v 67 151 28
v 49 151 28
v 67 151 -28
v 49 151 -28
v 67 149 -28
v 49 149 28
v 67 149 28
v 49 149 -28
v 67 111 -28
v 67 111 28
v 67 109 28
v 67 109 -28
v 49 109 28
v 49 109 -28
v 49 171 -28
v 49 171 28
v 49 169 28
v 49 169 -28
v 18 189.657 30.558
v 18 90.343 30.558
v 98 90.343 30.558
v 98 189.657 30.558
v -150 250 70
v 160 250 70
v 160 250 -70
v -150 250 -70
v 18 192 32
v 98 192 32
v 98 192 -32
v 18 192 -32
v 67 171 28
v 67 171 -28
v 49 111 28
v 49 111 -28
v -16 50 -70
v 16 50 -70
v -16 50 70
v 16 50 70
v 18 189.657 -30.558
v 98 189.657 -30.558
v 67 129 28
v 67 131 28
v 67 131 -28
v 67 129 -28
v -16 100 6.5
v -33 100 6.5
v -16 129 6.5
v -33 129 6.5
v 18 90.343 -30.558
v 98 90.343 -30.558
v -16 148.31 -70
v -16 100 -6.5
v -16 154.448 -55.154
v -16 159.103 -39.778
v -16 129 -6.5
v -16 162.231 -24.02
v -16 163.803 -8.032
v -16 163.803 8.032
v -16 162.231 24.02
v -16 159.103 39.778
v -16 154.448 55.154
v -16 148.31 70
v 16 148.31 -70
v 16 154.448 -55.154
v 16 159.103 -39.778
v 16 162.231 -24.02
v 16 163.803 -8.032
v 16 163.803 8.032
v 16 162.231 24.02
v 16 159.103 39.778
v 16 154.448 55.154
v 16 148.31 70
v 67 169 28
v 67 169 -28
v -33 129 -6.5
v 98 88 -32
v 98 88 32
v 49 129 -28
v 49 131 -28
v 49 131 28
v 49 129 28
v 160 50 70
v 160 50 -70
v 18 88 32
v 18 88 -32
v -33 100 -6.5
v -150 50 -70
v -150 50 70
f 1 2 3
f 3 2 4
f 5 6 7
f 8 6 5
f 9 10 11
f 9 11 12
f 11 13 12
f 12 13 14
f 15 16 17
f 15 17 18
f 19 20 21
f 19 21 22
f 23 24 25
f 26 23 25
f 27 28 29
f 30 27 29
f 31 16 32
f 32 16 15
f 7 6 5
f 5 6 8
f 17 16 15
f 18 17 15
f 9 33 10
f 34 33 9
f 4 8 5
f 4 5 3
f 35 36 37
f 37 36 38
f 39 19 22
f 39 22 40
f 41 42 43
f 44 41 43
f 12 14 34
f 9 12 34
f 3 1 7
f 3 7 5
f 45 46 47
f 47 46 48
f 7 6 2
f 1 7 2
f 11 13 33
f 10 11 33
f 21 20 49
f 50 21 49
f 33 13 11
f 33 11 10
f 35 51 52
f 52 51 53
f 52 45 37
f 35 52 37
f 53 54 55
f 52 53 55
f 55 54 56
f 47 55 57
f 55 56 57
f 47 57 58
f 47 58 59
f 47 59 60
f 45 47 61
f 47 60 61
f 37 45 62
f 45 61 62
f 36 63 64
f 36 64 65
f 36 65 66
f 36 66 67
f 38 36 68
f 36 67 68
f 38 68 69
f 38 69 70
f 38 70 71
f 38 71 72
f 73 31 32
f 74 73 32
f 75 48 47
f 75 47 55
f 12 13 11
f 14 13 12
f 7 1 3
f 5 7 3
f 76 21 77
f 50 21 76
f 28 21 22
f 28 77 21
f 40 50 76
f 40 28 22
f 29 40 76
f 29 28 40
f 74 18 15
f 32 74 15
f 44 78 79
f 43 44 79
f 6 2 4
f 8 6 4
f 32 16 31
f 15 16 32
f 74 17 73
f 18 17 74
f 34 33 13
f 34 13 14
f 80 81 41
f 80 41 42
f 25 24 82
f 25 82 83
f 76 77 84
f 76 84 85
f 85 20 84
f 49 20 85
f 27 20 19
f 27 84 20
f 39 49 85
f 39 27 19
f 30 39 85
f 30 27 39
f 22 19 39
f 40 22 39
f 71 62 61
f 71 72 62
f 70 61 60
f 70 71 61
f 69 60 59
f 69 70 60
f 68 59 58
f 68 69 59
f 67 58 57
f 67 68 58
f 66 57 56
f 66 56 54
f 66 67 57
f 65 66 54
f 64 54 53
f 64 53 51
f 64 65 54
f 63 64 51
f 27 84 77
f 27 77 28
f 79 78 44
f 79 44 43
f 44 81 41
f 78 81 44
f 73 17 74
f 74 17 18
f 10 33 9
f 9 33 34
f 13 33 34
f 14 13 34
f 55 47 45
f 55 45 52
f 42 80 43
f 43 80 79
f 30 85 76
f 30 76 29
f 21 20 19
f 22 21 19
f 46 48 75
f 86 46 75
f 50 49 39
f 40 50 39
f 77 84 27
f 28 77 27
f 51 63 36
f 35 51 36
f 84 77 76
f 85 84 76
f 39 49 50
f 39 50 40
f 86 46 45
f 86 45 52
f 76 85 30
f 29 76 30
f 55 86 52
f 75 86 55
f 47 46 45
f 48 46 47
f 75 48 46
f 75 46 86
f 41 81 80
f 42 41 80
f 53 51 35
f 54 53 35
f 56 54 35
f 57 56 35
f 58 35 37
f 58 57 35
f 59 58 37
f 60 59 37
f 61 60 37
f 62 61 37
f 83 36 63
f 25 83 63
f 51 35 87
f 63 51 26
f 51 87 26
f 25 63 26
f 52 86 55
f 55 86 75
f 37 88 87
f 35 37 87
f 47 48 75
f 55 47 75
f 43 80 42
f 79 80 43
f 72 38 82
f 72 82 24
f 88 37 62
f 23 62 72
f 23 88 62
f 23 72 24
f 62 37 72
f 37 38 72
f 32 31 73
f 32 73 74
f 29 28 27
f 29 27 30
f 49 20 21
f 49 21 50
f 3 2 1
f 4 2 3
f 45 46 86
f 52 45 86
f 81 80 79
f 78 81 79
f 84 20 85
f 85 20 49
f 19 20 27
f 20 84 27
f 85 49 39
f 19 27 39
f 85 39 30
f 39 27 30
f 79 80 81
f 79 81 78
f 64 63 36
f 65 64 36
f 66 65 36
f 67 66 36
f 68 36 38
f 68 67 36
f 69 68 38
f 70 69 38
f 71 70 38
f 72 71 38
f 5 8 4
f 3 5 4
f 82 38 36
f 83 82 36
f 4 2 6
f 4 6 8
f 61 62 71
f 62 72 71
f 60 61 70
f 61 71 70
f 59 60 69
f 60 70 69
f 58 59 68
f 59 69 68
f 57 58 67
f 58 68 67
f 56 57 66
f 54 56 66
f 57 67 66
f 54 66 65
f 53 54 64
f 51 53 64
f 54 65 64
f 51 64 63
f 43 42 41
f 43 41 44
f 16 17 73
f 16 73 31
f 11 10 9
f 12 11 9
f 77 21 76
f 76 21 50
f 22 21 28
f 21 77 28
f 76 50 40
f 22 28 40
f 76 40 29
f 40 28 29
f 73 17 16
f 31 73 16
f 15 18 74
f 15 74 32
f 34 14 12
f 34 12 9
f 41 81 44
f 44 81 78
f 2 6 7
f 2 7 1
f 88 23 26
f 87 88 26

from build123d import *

# Parameters (mm, degrees)
FLUID_BOX_START    = -150
SKETCH1_W          = 140
SKETCH1_H          = 200
FLUID_BOX_DEPTH    = 310
ROTOR_TOOL_DEPTH   = 16
DUCT_TOOL_START    = 18
SKETCH3_W          = 64
SKETCH3_H          = 104
SKETCH3_W_2        = 61.115879828
SKETCH3_H_2        = 99.313304722
DUCT_TOOL_DEPTH    = 80
LOUVER1_TOOL_START = 49
SKETCH4_W          = 56
SKETCH4_H          = 2
LOUVER1_TOOL_DEPTH = 18
LOUVER2_TOOL_START = 49
SKETCH5_W          = 56
SKETCH5_H          = 2
LOUVER2_TOOL_DEPTH = 18
LOUVER3_TOOL_START = 49
SKETCH6_W          = 56
SKETCH6_H          = 2
LOUVER3_TOOL_DEPTH = 18
LOUVER4_TOOL_START = 49
SKETCH7_W          = 56
SKETCH7_H          = 2
LOUVER4_TOOL_DEPTH = 18
POCKET_TOOL_START  = -33
SKETCH8_W          = 13
SKETCH8_H          = 29
POCKET_TOOL_DEPTH  = 17
ROTOR_KEEP_DEPTH   = 16
DUCT_KEEP_START    = 18
SKETCH10_W         = 64
SKETCH10_H         = 104
SKETCH10_W_2       = 61.115879828
SKETCH10_H_2       = 99.313304722
DUCT_KEEP_DEPTH    = 80
LOUVER1_KEEP_START = 49
SKETCH11_W         = 56
SKETCH11_H         = 2
LOUVER1_KEEP_DEPTH = 18
LOUVER2_KEEP_START = 49
SKETCH12_W         = 56
SKETCH12_H         = 2
LOUVER2_KEEP_DEPTH = 18
LOUVER3_KEEP_START = 49
SKETCH13_W         = 56
SKETCH13_H         = 2
LOUVER3_KEEP_DEPTH = 18
LOUVER4_KEEP_START = 49
SKETCH14_W         = 56
SKETCH14_H         = 2
LOUVER4_KEEP_DEPTH = 18
POCKET_KEEP_START  = -33
SKETCH15_W         = 13
SKETCH15_H         = 29
POCKET_KEEP_DEPTH  = 17


with BuildPart() as part:
    # Sketch1 → fluid_box (new body)
    with BuildSketch(Plane(origin=(0, 0, 0), x_dir=(0, 0, -1), z_dir=(1, 0, 0)).offset(FLUID_BOX_START)):
        with Locations((0, 150)):
            Rectangle(SKETCH1_W, SKETCH1_H)
    extrude(amount=FLUID_BOX_DEPTH)


with BuildPart() as body_2:
    # Sketch2 → rotor_tool (new, symmetric)
    with BuildSketch(Plane(origin=(0, 0, 0), x_dir=(0, 0, -1), z_dir=(1, 0, 0))):
        with BuildLine():
            Line((70, 50), (-70, 50))
            Line((-70, 50), (-70, 148.310485132))
            ThreePointArc((-70, 148.310485132), (0, 164), (70, 148.310485132))
            Line((70, 148.310485132), (70, 50))
        make_face()
    extrude(amount=ROTOR_TOOL_DEPTH, both=True)


with BuildPart() as body_3:
    # Sketch3 → duct_tool (new body)
    with BuildSketch(Plane(origin=(0, 0, 0), x_dir=(0, 0, -1), z_dir=(1, 0, 0)).offset(DUCT_TOOL_START)):
        with Locations((0, 140)):
            Rectangle(SKETCH3_W, SKETCH3_H)
        with Locations((0, 140)):
            Rectangle(SKETCH3_W_2, SKETCH3_H_2, mode=Mode.SUBTRACT)
    extrude(amount=DUCT_TOOL_DEPTH)


with BuildPart() as body_4:
    # Sketch4 → louver1_tool (new body)
    with BuildSketch(Plane(origin=(0, 0, 0), x_dir=(0, 0, -1), z_dir=(1, 0, 0)).offset(LOUVER1_TOOL_START)):
        with Locations((0, 110)):
            Rectangle(SKETCH4_W, SKETCH4_H)
    extrude(amount=LOUVER1_TOOL_DEPTH)


with BuildPart() as body_5:
    # Sketch5 → louver2_tool (new body)
    with BuildSketch(Plane(origin=(0, 0, 0), x_dir=(0, 0, -1), z_dir=(1, 0, 0)).offset(LOUVER2_TOOL_START)):
        with Locations((0, 130)):
            Rectangle(SKETCH5_W, SKETCH5_H)
    extrude(amount=LOUVER2_TOOL_DEPTH)


with BuildPart() as body_6:
    # Sketch6 → louver3_tool (new body)
    with BuildSketch(Plane(origin=(0, 0, 0), x_dir=(0, 0, -1), z_dir=(1, 0, 0)).offset(LOUVER3_TOOL_START)):
        with Locations((0, 150)):
            Rectangle(SKETCH6_W, SKETCH6_H)
    extrude(amount=LOUVER3_TOOL_DEPTH)


with BuildPart() as body_7:
    # Sketch7 → louver4_tool (new body)
    with BuildSketch(Plane(origin=(0, 0, 0), x_dir=(0, 0, -1), z_dir=(1, 0, 0)).offset(LOUVER4_TOOL_START)):
        with Locations((0, 170)):
            Rectangle(SKETCH7_W, SKETCH7_H)
    extrude(amount=LOUVER4_TOOL_DEPTH)


with BuildPart() as body_8:
    # Sketch8 → pocket_tool (new body)
    with BuildSketch(Plane(origin=(0, 0, 0), x_dir=(0, 0, -1), z_dir=(1, 0, 0)).offset(POCKET_TOOL_START)):
        with Locations((0, 114.5)):
            Rectangle(SKETCH8_W, SKETCH8_H)
    extrude(amount=POCKET_TOOL_DEPTH)


with BuildPart() as part_1:
    add(part.part)

    # Combine1: cut body 5, body 3, body 7, body 6, body 8, body 2, body 4
    add(body_5.part, mode=Mode.SUBTRACT)
    add(body_3.part, mode=Mode.SUBTRACT)
    add(body_7.part, mode=Mode.SUBTRACT)
    add(body_6.part, mode=Mode.SUBTRACT)
    add(body_8.part, mode=Mode.SUBTRACT)
    add(body_2.part, mode=Mode.SUBTRACT)
    add(body_4.part, mode=Mode.SUBTRACT)


with BuildPart() as body_2_2:
    # Sketch9 → rotor_keep (new, symmetric)
    with BuildSketch(Plane(origin=(0, 0, 0), x_dir=(0, 0, -1), z_dir=(1, 0, 0))):
        with BuildLine():
            Line((70, 50), (-70, 50))
            Line((-70, 50), (-70, 148.310485132))
            ThreePointArc((-70, 148.310485132), (0, 164), (70, 148.310485132))
            Line((70, 148.310485132), (70, 50))
        make_face()
    extrude(amount=ROTOR_KEEP_DEPTH, both=True)


with BuildPart() as body_3_2:
    # Sketch10 → duct_keep (new body)
    with BuildSketch(Plane(origin=(0, 0, 0), x_dir=(0, 0, -1), z_dir=(1, 0, 0)).offset(DUCT_KEEP_START)):
        with Locations((0, 140)):
            Rectangle(SKETCH10_W, SKETCH10_H)
        with Locations((0, 140)):
            Rectangle(SKETCH10_W_2, SKETCH10_H_2, mode=Mode.SUBTRACT)
    extrude(amount=DUCT_KEEP_DEPTH)


with BuildPart() as body_4_2:
    # Sketch11 → louver1_keep (new body)
    with BuildSketch(Plane(origin=(0, 0, 0), x_dir=(0, 0, -1), z_dir=(1, 0, 0)).offset(LOUVER1_KEEP_START)):
        with Locations((0, 110)):
            Rectangle(SKETCH11_W, SKETCH11_H)
    extrude(amount=LOUVER1_KEEP_DEPTH)


with BuildPart() as body_5_2:
    # Sketch12 → louver2_keep (new body)
    with BuildSketch(Plane(origin=(0, 0, 0), x_dir=(0, 0, -1), z_dir=(1, 0, 0)).offset(LOUVER2_KEEP_START)):
        with Locations((0, 130)):
            Rectangle(SKETCH12_W, SKETCH12_H)
    extrude(amount=LOUVER2_KEEP_DEPTH)


with BuildPart() as body_6_2:
    # Sketch13 → louver3_keep (new body)
    with BuildSketch(Plane(origin=(0, 0, 0), x_dir=(0, 0, -1), z_dir=(1, 0, 0)).offset(LOUVER3_KEEP_START)):
        with Locations((0, 150)):
            Rectangle(SKETCH13_W, SKETCH13_H)
    extrude(amount=LOUVER3_KEEP_DEPTH)


with BuildPart() as body_7_2:
    # Sketch14 → louver4_keep (new body)
    with BuildSketch(Plane(origin=(0, 0, 0), x_dir=(0, 0, -1), z_dir=(1, 0, 0)).offset(LOUVER4_KEEP_START)):
        with Locations((0, 170)):
            Rectangle(SKETCH14_W, SKETCH14_H)
    extrude(amount=LOUVER4_KEEP_DEPTH)


with BuildPart() as body_8_2:
    # Sketch15 → pocket_keep (new body)
    with BuildSketch(Plane(origin=(0, 0, 0), x_dir=(0, 0, -1), z_dir=(1, 0, 0)).offset(POCKET_KEEP_START)):
        with Locations((0, 114.5)):
            Rectangle(SKETCH15_W, SKETCH15_H)
    extrude(amount=POCKET_KEEP_DEPTH)


solid = Compound([part_1.part, body_2_2.part, body_3_2.part, body_4_2.part, body_5_2.part, body_6_2.part, body_7_2.part, body_8_2.part])
